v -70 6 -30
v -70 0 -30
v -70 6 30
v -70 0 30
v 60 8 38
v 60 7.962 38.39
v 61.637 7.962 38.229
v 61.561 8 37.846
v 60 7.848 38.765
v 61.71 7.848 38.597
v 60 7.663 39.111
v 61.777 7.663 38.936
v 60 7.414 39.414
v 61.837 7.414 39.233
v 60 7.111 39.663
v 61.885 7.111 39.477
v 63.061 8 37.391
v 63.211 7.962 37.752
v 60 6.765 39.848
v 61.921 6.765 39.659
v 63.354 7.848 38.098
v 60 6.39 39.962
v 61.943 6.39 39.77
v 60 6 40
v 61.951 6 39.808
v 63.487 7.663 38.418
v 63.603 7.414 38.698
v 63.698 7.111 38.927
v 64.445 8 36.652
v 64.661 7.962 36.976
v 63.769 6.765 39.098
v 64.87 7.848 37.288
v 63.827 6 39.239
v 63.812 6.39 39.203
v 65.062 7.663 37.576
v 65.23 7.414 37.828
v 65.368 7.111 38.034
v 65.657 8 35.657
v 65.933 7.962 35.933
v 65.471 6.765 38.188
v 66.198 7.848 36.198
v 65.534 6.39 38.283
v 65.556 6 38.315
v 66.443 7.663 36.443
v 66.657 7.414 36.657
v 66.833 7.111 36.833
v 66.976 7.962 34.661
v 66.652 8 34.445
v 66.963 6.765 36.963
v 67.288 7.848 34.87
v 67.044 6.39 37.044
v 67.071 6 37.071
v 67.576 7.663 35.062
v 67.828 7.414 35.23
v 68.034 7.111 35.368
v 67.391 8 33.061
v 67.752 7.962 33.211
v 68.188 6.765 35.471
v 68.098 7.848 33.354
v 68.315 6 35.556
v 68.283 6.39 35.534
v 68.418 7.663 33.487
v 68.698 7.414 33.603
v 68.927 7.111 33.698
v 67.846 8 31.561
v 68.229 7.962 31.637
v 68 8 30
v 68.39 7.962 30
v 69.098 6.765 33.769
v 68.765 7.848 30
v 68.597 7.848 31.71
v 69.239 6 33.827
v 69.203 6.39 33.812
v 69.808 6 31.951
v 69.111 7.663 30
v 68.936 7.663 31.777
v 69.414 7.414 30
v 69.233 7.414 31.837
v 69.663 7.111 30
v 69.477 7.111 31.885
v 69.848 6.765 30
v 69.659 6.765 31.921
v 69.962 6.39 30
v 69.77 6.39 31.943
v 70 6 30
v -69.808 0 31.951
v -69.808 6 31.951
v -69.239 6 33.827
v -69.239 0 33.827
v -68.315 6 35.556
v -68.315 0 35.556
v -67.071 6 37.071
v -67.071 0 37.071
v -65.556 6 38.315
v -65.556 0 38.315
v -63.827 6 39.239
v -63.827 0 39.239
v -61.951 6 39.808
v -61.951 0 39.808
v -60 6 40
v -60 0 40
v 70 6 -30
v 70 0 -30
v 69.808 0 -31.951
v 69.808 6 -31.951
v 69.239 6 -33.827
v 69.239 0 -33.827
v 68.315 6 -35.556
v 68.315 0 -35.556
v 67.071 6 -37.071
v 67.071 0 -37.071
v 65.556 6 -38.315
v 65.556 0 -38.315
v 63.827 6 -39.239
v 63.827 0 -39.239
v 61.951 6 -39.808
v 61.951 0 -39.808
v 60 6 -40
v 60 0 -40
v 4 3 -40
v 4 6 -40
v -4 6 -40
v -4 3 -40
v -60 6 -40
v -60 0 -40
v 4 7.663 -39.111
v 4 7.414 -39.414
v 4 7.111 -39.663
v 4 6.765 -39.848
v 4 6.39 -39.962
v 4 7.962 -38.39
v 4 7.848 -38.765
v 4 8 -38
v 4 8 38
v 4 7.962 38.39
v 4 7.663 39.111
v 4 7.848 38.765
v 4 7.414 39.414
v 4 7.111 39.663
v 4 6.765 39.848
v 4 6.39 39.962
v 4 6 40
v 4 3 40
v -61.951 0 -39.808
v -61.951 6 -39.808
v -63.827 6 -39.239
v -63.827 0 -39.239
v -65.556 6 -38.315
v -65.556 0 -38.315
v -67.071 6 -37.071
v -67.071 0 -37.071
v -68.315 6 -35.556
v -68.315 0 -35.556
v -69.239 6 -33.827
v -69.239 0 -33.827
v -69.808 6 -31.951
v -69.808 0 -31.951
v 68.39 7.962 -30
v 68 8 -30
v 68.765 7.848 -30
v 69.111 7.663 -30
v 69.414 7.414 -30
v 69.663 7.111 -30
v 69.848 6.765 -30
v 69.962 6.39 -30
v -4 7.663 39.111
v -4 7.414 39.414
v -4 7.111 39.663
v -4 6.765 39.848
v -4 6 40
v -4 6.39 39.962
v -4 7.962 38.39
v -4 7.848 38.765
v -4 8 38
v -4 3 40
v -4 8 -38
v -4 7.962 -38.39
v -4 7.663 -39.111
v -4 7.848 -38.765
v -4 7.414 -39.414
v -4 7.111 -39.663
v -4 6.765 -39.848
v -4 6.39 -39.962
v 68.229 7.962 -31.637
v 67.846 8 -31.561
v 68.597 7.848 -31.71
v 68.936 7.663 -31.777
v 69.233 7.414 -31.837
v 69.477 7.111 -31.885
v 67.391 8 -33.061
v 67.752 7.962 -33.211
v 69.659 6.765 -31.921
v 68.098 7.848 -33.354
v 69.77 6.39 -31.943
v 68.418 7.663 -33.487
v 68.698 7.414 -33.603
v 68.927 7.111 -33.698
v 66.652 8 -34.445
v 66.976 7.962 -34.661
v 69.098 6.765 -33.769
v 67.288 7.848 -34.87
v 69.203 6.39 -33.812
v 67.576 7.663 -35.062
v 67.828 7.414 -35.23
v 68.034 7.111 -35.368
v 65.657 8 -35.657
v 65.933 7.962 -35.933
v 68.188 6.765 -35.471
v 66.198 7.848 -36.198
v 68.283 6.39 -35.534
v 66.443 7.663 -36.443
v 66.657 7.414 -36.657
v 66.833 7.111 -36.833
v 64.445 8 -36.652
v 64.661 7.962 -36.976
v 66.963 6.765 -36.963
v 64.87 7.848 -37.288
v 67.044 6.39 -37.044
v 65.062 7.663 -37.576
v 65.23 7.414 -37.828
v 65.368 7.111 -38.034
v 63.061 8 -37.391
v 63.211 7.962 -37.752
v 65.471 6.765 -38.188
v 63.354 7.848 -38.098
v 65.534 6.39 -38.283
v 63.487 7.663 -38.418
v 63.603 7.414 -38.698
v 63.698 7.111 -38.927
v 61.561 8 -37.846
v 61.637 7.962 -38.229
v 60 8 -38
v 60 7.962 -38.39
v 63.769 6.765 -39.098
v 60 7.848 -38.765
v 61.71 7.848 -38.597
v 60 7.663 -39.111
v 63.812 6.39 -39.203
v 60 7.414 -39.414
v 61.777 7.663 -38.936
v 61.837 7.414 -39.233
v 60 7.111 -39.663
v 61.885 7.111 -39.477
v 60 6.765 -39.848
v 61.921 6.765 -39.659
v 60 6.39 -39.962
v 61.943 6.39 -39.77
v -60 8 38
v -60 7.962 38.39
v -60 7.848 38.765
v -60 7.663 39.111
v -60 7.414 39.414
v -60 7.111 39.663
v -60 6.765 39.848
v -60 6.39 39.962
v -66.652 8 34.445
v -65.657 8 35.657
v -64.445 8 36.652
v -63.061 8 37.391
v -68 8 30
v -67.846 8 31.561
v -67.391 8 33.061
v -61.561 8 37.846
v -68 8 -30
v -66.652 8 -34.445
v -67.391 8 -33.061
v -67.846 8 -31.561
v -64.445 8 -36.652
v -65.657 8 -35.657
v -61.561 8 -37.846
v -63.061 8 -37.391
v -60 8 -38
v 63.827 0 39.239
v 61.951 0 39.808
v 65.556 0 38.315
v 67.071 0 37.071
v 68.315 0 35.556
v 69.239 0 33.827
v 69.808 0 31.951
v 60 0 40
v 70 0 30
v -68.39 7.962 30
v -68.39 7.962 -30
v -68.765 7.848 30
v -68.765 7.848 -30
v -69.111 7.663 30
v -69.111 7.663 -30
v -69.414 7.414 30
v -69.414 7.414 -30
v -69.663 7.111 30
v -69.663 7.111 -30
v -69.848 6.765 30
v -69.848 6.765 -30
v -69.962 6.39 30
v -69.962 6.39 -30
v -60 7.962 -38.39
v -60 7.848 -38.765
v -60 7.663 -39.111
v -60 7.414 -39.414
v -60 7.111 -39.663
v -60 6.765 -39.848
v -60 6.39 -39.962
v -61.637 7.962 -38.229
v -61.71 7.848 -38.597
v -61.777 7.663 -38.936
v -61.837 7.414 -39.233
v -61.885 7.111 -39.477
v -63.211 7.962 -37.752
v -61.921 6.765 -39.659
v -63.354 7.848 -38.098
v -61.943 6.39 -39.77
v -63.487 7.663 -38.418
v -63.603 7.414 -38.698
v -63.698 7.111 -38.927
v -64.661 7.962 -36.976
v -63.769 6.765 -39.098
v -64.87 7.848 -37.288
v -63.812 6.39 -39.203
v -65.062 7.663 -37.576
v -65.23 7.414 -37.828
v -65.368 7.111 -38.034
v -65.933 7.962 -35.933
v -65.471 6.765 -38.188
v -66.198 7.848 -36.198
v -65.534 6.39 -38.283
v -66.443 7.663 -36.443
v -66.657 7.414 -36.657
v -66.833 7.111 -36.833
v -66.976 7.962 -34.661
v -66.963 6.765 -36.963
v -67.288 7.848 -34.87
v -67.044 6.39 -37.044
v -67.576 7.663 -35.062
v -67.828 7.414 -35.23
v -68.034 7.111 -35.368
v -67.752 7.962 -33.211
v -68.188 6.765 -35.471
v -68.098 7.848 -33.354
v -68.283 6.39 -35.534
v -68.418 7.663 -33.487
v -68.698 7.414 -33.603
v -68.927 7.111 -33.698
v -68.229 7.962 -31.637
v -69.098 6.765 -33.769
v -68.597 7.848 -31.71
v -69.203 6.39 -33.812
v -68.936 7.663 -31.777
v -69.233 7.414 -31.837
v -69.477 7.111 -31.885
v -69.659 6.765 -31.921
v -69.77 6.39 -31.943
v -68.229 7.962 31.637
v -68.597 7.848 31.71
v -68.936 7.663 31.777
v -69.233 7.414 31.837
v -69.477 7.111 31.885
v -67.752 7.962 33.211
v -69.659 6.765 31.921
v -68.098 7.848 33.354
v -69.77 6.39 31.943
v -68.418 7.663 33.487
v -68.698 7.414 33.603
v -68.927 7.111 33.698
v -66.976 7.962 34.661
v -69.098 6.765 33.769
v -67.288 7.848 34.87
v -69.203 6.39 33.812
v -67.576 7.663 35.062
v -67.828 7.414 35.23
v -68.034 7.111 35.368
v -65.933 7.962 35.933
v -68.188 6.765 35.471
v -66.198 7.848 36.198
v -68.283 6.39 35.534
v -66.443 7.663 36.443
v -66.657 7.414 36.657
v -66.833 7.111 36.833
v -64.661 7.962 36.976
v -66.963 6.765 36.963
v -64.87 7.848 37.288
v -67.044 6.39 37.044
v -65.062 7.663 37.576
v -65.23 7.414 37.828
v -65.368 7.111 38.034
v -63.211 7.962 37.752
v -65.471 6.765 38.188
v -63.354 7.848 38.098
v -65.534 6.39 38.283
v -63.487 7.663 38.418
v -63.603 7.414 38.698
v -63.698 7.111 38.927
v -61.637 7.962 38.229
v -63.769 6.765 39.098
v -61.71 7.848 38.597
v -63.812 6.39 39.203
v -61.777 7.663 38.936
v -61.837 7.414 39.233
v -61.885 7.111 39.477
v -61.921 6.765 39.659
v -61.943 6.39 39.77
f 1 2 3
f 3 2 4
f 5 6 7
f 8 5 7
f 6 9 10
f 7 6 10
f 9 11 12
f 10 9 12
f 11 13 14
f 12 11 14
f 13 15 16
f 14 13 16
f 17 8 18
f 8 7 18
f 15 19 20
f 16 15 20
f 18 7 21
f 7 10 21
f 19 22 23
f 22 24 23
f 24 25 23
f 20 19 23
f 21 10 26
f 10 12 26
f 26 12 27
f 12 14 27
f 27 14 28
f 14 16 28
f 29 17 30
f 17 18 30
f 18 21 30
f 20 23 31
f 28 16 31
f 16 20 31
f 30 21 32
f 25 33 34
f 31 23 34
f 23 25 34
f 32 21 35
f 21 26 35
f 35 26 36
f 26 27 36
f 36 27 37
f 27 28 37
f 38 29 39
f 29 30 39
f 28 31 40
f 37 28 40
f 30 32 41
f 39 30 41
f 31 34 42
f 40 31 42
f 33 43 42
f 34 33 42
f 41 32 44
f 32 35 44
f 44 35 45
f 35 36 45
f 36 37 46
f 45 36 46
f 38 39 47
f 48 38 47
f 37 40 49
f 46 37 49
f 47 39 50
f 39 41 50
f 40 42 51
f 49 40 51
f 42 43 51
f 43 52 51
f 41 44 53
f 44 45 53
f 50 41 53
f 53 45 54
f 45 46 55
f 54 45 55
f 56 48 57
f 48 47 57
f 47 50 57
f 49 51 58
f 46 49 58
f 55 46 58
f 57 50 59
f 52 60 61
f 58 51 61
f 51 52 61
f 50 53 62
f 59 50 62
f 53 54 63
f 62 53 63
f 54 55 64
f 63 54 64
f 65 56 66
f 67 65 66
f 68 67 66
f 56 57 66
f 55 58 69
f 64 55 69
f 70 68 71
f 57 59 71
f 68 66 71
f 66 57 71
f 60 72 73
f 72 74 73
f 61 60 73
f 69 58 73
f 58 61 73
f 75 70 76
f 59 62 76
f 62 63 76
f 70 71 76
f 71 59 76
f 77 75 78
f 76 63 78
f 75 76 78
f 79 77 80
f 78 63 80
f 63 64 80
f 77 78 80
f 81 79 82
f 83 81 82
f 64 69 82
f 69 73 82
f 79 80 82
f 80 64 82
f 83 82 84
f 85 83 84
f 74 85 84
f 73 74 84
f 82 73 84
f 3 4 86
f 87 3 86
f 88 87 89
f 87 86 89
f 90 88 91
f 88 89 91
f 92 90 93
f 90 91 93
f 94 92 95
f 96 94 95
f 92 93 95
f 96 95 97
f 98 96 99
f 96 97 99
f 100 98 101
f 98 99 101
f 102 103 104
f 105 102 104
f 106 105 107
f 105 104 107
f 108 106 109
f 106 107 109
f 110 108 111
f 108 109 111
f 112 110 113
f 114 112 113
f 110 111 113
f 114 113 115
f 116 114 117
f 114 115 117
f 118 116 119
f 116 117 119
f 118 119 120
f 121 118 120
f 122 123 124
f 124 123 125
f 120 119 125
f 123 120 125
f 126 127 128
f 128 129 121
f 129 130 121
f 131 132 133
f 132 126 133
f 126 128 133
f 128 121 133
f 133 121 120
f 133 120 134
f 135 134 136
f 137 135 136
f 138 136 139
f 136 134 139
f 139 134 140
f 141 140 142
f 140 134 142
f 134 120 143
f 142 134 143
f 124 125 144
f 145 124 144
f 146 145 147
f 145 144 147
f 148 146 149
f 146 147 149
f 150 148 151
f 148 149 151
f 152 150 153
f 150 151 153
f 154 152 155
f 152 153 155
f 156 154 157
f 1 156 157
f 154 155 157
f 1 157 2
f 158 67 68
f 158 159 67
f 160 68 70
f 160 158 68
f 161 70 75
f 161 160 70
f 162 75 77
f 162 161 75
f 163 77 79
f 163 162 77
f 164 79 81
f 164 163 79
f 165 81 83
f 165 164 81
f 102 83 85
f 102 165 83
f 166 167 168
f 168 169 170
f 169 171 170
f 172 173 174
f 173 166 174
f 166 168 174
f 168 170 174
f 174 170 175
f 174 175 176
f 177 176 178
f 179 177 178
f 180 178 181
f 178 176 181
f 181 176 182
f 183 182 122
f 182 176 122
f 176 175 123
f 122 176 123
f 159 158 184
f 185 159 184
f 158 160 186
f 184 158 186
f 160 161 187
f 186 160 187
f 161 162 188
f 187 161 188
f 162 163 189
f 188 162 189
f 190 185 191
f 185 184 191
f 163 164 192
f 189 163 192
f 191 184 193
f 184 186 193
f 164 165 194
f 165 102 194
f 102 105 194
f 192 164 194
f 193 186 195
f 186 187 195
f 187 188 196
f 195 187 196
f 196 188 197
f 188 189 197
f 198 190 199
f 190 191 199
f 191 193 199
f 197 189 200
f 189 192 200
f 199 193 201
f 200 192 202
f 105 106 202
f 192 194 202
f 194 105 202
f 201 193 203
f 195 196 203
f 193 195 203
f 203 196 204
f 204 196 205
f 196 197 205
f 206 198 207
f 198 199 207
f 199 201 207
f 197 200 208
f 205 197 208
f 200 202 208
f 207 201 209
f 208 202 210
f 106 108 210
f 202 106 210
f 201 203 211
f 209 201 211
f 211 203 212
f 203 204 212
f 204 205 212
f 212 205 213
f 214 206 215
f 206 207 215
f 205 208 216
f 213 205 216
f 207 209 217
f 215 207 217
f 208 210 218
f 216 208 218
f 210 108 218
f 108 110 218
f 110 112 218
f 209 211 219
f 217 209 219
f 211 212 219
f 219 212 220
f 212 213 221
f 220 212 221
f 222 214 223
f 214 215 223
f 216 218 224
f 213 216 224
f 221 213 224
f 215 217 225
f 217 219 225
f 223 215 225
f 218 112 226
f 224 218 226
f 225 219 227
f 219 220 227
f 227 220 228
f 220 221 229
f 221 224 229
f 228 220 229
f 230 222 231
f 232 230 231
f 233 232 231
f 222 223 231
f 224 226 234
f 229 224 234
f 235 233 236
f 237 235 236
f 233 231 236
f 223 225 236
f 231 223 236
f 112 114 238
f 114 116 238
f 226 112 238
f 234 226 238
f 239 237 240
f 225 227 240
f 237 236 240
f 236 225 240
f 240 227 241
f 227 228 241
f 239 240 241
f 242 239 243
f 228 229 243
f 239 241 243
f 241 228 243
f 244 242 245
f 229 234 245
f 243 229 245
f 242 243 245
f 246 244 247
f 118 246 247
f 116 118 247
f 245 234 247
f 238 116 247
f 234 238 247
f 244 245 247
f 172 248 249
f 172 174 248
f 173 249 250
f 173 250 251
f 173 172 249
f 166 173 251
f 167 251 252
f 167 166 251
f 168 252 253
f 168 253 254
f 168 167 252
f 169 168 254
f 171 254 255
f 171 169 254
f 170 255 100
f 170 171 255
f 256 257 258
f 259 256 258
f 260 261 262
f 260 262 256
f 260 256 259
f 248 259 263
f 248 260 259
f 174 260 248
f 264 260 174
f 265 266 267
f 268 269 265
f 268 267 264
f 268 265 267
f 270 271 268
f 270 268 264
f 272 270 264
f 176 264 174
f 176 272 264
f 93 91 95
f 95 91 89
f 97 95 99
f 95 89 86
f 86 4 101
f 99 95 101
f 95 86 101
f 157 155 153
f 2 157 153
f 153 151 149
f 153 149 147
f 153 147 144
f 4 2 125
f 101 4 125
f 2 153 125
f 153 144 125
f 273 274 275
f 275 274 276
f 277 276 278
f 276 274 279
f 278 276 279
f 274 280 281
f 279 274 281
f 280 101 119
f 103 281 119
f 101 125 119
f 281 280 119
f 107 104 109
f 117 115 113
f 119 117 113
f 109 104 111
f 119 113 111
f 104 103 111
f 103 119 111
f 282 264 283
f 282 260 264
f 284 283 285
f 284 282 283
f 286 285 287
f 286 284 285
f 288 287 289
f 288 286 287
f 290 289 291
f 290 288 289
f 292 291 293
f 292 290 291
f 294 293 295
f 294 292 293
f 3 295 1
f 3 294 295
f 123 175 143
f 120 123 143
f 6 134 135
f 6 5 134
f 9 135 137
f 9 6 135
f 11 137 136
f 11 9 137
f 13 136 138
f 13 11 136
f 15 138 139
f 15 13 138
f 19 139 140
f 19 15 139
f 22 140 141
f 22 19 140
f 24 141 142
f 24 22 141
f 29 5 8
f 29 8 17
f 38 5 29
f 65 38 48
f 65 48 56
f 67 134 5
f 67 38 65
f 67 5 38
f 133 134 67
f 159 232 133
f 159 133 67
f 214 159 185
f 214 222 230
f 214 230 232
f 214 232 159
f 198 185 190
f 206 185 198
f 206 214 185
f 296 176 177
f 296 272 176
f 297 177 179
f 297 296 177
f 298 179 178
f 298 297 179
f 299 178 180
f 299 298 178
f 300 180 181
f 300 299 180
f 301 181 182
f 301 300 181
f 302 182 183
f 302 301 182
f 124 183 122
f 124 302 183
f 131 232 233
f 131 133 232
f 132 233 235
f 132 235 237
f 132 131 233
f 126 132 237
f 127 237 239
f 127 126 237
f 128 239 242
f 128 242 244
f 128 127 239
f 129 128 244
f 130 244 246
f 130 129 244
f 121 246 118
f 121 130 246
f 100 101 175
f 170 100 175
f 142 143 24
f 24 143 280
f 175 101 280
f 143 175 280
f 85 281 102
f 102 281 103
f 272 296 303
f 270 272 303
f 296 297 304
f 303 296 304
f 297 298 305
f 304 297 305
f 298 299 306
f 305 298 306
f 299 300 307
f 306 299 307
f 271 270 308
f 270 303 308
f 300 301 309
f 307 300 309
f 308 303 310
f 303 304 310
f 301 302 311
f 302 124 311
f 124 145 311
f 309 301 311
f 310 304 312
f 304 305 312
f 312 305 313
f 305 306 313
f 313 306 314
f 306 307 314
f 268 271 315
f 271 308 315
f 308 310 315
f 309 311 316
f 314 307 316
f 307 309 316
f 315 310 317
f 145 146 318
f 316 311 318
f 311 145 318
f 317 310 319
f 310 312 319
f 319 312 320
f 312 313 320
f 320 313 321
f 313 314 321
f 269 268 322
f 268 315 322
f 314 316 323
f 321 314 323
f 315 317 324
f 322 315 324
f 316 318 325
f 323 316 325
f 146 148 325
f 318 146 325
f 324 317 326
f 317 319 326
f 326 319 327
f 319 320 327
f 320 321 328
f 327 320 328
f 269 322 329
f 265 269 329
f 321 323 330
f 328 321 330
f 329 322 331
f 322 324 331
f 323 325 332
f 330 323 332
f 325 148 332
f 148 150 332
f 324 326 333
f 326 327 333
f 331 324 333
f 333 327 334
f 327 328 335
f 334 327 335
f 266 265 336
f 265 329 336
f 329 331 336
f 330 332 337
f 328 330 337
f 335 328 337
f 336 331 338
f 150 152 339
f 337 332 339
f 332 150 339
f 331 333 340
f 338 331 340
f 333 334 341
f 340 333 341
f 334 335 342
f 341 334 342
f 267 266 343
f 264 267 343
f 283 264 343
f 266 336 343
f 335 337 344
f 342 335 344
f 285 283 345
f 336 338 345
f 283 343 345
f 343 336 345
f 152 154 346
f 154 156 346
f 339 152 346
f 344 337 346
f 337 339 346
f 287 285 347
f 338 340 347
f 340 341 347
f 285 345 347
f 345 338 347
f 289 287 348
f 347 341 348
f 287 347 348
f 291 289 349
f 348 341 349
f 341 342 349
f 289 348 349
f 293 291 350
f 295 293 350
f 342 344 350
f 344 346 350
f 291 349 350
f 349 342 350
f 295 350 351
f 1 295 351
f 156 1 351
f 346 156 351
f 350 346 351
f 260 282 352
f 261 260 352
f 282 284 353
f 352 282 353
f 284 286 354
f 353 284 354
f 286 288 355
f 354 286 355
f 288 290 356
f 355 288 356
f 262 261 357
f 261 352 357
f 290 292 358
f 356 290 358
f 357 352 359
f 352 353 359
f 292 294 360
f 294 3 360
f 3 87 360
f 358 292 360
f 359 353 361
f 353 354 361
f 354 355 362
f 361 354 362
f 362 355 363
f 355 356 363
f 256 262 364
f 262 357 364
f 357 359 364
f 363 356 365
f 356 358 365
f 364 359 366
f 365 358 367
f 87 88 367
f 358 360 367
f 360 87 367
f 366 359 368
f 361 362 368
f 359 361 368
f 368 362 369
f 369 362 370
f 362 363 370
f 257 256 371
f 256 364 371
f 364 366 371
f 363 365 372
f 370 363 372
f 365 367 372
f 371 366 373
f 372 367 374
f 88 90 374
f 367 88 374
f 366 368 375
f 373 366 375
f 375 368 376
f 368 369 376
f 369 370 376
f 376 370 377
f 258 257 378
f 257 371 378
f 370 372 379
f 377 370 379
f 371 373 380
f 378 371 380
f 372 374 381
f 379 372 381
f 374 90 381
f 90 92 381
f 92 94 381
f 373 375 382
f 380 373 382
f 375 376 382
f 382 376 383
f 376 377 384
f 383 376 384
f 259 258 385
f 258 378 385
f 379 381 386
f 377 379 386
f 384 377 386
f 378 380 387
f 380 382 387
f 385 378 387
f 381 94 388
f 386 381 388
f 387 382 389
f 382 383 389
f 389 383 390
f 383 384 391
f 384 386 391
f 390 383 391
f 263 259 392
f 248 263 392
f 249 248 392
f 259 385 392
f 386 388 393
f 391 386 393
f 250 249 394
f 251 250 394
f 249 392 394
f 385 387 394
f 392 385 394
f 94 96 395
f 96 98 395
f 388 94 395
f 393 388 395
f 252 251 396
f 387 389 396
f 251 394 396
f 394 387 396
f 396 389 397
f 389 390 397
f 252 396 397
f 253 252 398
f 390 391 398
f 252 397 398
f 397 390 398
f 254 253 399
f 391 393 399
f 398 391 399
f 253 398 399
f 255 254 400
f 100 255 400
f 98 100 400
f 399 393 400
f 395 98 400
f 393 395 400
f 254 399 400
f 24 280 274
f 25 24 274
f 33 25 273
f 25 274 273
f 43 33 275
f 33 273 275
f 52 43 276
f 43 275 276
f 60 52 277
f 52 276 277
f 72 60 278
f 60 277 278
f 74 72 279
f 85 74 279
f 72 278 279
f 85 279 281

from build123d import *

# Parameters (mm, degrees)
SKETCH1_W           = 8
SKETCH1_H           = 80
BOSS_EXTRUDE1_DEPTH = 3
BOSS_EXTRUDE2_DEPTH = 8
FILLET1_R           = 2


with BuildPart() as part:
    # Sketch1 → Boss-Extrude1 (new body)
    with BuildSketch(Plane(origin=(0, 0, 0), x_dir=(1, 0, 0), z_dir=(0, 1, 0))):
        Rectangle(SKETCH1_W, SKETCH1_H)
    extrude(amount=BOSS_EXTRUDE1_DEPTH)

    # Sketch1<3> → Boss-Extrude2 (add)
    with BuildSketch(Plane(origin=(0, 0, 0), x_dir=(1, 0, 0), z_dir=(0, 1, 0))):
        with BuildLine():
            ThreePointArc((-70, -30), (-67.071067812, -37.071067812), (-60, -40))
            Line((-60, -40), (-4, -40))
            Line((-4, -40), (-4, 40))
            Line((-4, 40), (-60, 40))
            ThreePointArc((-60, 40), (-67.071067812, 37.071067812), (-70, 30))
            Line((-70, 30), (-70, -30))
        make_face()
        with BuildLine():
            Line((4, 40), (4, -40))
            Line((4, -40), (60, -40))
            ThreePointArc((60, -40), (67.071067812, -37.071067812), (70, -30))
            Line((70, -30), (70, 30))
            ThreePointArc((70, 30), (67.071067812, 37.071067812), (60, 40))
            Line((60, 40), (4, 40))
        make_face()
    extrude(amount=BOSS_EXTRUDE2_DEPTH)

    # Fillet1
    fillet1_edges = [part.edges().sort_by_distance(p)[0] for p in [
        (-32, 8, -40),
        (-70, 8, 0),
        (-67.071067812, 8, -37.071067812),
        (-67.071067812, 8, 37.071067812),
        (-32, 8, 40),
        (67.071067812, 8, 37.071067812),
        (67.071067812, 8, -37.071067812),
        (32, 8, -40),
        (70, 8, 0),
        (32, 8, 40),
    ]]
    fillet(fillet1_edges, radius=FILLET1_R)


solid = part.part
